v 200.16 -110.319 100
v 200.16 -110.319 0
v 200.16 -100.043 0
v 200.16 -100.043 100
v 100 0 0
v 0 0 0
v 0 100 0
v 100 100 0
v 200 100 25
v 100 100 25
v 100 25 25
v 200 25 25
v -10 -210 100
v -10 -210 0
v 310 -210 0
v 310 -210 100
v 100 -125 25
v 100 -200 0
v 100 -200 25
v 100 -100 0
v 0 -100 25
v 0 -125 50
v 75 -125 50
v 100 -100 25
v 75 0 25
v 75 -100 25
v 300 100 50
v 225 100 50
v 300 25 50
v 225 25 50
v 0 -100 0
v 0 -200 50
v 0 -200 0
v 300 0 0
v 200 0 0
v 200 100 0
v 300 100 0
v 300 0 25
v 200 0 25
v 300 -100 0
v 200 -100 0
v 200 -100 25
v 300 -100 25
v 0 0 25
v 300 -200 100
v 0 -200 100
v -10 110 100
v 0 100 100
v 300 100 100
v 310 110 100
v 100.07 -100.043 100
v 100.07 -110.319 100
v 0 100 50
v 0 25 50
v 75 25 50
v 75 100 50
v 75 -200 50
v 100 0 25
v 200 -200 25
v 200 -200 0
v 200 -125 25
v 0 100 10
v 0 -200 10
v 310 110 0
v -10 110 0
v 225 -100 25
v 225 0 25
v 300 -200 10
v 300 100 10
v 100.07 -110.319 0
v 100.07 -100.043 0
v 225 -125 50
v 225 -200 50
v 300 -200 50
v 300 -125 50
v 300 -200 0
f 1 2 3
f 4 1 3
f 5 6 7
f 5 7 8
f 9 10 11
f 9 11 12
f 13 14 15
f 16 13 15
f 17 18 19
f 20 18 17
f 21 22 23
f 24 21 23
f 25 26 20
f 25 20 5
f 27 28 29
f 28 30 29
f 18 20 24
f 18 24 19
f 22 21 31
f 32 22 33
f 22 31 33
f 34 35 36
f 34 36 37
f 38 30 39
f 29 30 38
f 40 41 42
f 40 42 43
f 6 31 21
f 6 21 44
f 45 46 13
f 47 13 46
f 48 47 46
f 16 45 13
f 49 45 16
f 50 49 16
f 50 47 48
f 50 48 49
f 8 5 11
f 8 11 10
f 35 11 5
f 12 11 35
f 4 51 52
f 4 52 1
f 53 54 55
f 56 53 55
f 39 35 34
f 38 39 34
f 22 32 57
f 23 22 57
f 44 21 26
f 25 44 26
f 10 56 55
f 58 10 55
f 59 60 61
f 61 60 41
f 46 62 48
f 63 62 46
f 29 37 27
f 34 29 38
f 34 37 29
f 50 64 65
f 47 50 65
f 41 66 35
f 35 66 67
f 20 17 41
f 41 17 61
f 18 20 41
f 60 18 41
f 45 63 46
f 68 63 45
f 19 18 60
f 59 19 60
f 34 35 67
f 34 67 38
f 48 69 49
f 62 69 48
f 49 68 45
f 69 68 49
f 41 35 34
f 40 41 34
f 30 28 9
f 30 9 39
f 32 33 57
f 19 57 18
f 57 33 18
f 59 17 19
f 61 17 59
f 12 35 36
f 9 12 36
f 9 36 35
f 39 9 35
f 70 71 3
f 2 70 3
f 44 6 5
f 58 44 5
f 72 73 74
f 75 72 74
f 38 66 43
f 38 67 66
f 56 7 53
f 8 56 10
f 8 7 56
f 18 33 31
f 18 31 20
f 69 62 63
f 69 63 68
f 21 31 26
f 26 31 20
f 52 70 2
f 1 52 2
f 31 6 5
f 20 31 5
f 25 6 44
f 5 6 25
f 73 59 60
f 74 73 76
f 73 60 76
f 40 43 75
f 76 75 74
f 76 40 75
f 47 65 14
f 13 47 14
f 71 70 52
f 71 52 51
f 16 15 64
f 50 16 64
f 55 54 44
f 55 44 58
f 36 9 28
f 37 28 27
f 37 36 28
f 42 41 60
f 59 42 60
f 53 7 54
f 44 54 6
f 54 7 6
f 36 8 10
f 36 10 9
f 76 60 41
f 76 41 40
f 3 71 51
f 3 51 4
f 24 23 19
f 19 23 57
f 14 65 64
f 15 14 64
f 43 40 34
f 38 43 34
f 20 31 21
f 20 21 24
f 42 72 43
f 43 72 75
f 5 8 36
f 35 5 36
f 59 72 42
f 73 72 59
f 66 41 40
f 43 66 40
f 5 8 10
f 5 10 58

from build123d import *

# Parameters (mm, degrees)
F0_W      = 100
F0_H      = 100
F1_DEPTH  = 25
F2_W      = 100
F2_H      = 100
F3_DEPTH  = 50
F4_SIZE   = 24.99999
F4_2_SIZE = 24.99999
F4_3_SIZE = 24.99999
F4_4_SIZE = 24.99999
F4_5_SIZE = 24.99999
F4_6_SIZE = 24.99999
F4_7_SIZE = 24.99999
F4_8_SIZE = 24.99999
F6_DEPTH  = 100
F7_T      = -10
F8_W      = 100.09
F8_H      = 10.2765932679
F9_DEPTH  = 100


# Not quite as in the source:
# - a fillet or chamfer is up to 0.001 mm smaller than in the source, because OpenCascade refuses the exact size


with BuildPart() as f1:
    # F0 (on Top) → F1 (new body)
    with BuildSketch(Plane.XY):
        with Locations((150, 50)):
            Rectangle(F0_W, F0_H)
    extrude(amount=F1_DEPTH)

    # F4#7 (size 25 in the source; OpenCascade refuses exactly that, so slightly less here)
    f4_7_edges = [f1.edges().sort_by_distance(p)[0] for p in [
        (150, 0, 25),
    ]]
    chamfer(f4_7_edges, length=F4_7_SIZE)


with BuildPart() as f1b:
    # F0 (on Top) → F1, piece 2 (new body)
    with BuildSketch(Plane.XY):
        with Locations((50, -50)):
            Rectangle(F0_W, F0_H)
    extrude(amount=F1_DEPTH)

    # F4#6 (size 25 in the source; OpenCascade refuses exactly that, so slightly less here)
    f4_6_edges = [f1b.edges().sort_by_distance(p)[0] for p in [
        (100, -50, 25),
    ]]
    chamfer(f4_6_edges, length=F4_6_SIZE)


with BuildPart() as f1c:
    # F0 (on Top) → F1, piece 3 (new body)
    with BuildSketch(Plane.XY):
        with Locations((150, -150)):
            Rectangle(F0_W, F0_H)
    extrude(amount=F1_DEPTH)

    # F4#5 (size 25 in the source; OpenCascade refuses exactly that, so slightly less here)
    f4_5_edges = [f1c.edges().sort_by_distance(p)[0] for p in [
        (150, -100, 25),
    ]]
    chamfer(f4_5_edges, length=F4_5_SIZE)


with BuildPart() as f1d:
    # F0 (on Top) → F1, piece 4 (new body)
    with BuildSketch(Plane.XY):
        with Locations((250, -50)):
            Rectangle(F0_W, F0_H)
    extrude(amount=F1_DEPTH)

    # F4#8 (size 25 in the source; OpenCascade refuses exactly that, so slightly less here)
    f4_8_edges = [f1d.edges().sort_by_distance(p)[0] for p in [
        (200, -50, 25),
    ]]
    chamfer(f4_8_edges, length=F4_8_SIZE)


with BuildPart() as f3:
    # F2 (on face) → F3 (new body)
    with BuildSketch(Plane(origin=(0, 0, 0), x_dir=(1, 0, 0), z_dir=(0, 0, -1))):
        with Locations((50, -50)):
            Rectangle(F2_W, F2_H)
    extrude(amount=-F3_DEPTH)

    # F4#2 (size 25 in the source; OpenCascade refuses exactly that, so slightly less here)
    f4_2_edges = [f3.edges().sort_by_distance(p)[0] for p in [
        (50, 0, 50),
        (100, 50, 50),
    ]]
    chamfer(f4_2_edges, length=F4_2_SIZE)


with BuildPart() as f3b:
    # F2 (on face) → F3, piece 2 (new body)
    with BuildSketch(Plane(origin=(0, 0, 0), x_dir=(1, 0, 0), z_dir=(0, 0, -1))):
        with Locations((50, 150)):
            Rectangle(F2_W, F2_H)
    extrude(amount=-F3_DEPTH)

    # F4 (size 25 in the source; OpenCascade refuses exactly that, so slightly less here)
    f4_edges = [f3b.edges().sort_by_distance(p)[0] for p in [
        (100, -150, 50),
        (50, -100, 50),
    ]]
    chamfer(f4_edges, length=F4_SIZE)


with BuildPart() as f3c:
    # F2 (on face) → F3, piece 3 (new body)
    with BuildSketch(Plane(origin=(0, 0, 0), x_dir=(1, 0, 0), z_dir=(0, 0, -1))):
        with Locations((250, 150)):
            Rectangle(F2_W, F2_H)
    extrude(amount=-F3_DEPTH)

    # F4#4 (size 25 in the source; OpenCascade refuses exactly that, so slightly less here)
    f4_4_edges = [f3c.edges().sort_by_distance(p)[0] for p in [
        (250, -100, 50),
        (200, -150, 50),
    ]]
    chamfer(f4_4_edges, length=F4_4_SIZE)


with BuildPart() as f3d:
    # F2 (on face) → F3, piece 4 (new body)
    with BuildSketch(Plane(origin=(0, 0, 0), x_dir=(1, 0, 0), z_dir=(0, 0, -1))):
        with Locations((250, -50)):
            Rectangle(F2_W, F2_H)
    extrude(amount=-F3_DEPTH)

    # F4#3 (size 25 in the source; OpenCascade refuses exactly that, so slightly less here)
    f4_3_edges = [f3d.edges().sort_by_distance(p)[0] for p in [
        (200, 50, 50),
        (250, 0, 50),
    ]]
    chamfer(f4_3_edges, length=F4_3_SIZE)


with BuildPart() as f6:
    # F5 (on Top) → F6 (new body)
    with BuildSketch(Plane.XY):
        Polygon((-10, 110), (-10, 0), (-10, -210), (310, -210), (310, 110), align=None)
    extrude(amount=F6_DEPTH)

    # F7
    f7_openings = [f6.faces().sort_by_distance(p)[0] for p in [
        (150, -50, 100),
    ]]
    offset(amount=F7_T, openings=f7_openings)


with BuildPart() as f9:
    # F8 (on Top) → F9 (new body)
    with BuildSketch(Plane.XY):
        with Locations((150.1145795155, -105.1808483899)):
            Rectangle(F8_W, F8_H)
    extrude(amount=F9_DEPTH)


solid = Compound([f1.part, f1b.part, f1c.part, f1d.part, f3.part, f3b.part, f3c.part, f3d.part, f6.part, f9.part])
